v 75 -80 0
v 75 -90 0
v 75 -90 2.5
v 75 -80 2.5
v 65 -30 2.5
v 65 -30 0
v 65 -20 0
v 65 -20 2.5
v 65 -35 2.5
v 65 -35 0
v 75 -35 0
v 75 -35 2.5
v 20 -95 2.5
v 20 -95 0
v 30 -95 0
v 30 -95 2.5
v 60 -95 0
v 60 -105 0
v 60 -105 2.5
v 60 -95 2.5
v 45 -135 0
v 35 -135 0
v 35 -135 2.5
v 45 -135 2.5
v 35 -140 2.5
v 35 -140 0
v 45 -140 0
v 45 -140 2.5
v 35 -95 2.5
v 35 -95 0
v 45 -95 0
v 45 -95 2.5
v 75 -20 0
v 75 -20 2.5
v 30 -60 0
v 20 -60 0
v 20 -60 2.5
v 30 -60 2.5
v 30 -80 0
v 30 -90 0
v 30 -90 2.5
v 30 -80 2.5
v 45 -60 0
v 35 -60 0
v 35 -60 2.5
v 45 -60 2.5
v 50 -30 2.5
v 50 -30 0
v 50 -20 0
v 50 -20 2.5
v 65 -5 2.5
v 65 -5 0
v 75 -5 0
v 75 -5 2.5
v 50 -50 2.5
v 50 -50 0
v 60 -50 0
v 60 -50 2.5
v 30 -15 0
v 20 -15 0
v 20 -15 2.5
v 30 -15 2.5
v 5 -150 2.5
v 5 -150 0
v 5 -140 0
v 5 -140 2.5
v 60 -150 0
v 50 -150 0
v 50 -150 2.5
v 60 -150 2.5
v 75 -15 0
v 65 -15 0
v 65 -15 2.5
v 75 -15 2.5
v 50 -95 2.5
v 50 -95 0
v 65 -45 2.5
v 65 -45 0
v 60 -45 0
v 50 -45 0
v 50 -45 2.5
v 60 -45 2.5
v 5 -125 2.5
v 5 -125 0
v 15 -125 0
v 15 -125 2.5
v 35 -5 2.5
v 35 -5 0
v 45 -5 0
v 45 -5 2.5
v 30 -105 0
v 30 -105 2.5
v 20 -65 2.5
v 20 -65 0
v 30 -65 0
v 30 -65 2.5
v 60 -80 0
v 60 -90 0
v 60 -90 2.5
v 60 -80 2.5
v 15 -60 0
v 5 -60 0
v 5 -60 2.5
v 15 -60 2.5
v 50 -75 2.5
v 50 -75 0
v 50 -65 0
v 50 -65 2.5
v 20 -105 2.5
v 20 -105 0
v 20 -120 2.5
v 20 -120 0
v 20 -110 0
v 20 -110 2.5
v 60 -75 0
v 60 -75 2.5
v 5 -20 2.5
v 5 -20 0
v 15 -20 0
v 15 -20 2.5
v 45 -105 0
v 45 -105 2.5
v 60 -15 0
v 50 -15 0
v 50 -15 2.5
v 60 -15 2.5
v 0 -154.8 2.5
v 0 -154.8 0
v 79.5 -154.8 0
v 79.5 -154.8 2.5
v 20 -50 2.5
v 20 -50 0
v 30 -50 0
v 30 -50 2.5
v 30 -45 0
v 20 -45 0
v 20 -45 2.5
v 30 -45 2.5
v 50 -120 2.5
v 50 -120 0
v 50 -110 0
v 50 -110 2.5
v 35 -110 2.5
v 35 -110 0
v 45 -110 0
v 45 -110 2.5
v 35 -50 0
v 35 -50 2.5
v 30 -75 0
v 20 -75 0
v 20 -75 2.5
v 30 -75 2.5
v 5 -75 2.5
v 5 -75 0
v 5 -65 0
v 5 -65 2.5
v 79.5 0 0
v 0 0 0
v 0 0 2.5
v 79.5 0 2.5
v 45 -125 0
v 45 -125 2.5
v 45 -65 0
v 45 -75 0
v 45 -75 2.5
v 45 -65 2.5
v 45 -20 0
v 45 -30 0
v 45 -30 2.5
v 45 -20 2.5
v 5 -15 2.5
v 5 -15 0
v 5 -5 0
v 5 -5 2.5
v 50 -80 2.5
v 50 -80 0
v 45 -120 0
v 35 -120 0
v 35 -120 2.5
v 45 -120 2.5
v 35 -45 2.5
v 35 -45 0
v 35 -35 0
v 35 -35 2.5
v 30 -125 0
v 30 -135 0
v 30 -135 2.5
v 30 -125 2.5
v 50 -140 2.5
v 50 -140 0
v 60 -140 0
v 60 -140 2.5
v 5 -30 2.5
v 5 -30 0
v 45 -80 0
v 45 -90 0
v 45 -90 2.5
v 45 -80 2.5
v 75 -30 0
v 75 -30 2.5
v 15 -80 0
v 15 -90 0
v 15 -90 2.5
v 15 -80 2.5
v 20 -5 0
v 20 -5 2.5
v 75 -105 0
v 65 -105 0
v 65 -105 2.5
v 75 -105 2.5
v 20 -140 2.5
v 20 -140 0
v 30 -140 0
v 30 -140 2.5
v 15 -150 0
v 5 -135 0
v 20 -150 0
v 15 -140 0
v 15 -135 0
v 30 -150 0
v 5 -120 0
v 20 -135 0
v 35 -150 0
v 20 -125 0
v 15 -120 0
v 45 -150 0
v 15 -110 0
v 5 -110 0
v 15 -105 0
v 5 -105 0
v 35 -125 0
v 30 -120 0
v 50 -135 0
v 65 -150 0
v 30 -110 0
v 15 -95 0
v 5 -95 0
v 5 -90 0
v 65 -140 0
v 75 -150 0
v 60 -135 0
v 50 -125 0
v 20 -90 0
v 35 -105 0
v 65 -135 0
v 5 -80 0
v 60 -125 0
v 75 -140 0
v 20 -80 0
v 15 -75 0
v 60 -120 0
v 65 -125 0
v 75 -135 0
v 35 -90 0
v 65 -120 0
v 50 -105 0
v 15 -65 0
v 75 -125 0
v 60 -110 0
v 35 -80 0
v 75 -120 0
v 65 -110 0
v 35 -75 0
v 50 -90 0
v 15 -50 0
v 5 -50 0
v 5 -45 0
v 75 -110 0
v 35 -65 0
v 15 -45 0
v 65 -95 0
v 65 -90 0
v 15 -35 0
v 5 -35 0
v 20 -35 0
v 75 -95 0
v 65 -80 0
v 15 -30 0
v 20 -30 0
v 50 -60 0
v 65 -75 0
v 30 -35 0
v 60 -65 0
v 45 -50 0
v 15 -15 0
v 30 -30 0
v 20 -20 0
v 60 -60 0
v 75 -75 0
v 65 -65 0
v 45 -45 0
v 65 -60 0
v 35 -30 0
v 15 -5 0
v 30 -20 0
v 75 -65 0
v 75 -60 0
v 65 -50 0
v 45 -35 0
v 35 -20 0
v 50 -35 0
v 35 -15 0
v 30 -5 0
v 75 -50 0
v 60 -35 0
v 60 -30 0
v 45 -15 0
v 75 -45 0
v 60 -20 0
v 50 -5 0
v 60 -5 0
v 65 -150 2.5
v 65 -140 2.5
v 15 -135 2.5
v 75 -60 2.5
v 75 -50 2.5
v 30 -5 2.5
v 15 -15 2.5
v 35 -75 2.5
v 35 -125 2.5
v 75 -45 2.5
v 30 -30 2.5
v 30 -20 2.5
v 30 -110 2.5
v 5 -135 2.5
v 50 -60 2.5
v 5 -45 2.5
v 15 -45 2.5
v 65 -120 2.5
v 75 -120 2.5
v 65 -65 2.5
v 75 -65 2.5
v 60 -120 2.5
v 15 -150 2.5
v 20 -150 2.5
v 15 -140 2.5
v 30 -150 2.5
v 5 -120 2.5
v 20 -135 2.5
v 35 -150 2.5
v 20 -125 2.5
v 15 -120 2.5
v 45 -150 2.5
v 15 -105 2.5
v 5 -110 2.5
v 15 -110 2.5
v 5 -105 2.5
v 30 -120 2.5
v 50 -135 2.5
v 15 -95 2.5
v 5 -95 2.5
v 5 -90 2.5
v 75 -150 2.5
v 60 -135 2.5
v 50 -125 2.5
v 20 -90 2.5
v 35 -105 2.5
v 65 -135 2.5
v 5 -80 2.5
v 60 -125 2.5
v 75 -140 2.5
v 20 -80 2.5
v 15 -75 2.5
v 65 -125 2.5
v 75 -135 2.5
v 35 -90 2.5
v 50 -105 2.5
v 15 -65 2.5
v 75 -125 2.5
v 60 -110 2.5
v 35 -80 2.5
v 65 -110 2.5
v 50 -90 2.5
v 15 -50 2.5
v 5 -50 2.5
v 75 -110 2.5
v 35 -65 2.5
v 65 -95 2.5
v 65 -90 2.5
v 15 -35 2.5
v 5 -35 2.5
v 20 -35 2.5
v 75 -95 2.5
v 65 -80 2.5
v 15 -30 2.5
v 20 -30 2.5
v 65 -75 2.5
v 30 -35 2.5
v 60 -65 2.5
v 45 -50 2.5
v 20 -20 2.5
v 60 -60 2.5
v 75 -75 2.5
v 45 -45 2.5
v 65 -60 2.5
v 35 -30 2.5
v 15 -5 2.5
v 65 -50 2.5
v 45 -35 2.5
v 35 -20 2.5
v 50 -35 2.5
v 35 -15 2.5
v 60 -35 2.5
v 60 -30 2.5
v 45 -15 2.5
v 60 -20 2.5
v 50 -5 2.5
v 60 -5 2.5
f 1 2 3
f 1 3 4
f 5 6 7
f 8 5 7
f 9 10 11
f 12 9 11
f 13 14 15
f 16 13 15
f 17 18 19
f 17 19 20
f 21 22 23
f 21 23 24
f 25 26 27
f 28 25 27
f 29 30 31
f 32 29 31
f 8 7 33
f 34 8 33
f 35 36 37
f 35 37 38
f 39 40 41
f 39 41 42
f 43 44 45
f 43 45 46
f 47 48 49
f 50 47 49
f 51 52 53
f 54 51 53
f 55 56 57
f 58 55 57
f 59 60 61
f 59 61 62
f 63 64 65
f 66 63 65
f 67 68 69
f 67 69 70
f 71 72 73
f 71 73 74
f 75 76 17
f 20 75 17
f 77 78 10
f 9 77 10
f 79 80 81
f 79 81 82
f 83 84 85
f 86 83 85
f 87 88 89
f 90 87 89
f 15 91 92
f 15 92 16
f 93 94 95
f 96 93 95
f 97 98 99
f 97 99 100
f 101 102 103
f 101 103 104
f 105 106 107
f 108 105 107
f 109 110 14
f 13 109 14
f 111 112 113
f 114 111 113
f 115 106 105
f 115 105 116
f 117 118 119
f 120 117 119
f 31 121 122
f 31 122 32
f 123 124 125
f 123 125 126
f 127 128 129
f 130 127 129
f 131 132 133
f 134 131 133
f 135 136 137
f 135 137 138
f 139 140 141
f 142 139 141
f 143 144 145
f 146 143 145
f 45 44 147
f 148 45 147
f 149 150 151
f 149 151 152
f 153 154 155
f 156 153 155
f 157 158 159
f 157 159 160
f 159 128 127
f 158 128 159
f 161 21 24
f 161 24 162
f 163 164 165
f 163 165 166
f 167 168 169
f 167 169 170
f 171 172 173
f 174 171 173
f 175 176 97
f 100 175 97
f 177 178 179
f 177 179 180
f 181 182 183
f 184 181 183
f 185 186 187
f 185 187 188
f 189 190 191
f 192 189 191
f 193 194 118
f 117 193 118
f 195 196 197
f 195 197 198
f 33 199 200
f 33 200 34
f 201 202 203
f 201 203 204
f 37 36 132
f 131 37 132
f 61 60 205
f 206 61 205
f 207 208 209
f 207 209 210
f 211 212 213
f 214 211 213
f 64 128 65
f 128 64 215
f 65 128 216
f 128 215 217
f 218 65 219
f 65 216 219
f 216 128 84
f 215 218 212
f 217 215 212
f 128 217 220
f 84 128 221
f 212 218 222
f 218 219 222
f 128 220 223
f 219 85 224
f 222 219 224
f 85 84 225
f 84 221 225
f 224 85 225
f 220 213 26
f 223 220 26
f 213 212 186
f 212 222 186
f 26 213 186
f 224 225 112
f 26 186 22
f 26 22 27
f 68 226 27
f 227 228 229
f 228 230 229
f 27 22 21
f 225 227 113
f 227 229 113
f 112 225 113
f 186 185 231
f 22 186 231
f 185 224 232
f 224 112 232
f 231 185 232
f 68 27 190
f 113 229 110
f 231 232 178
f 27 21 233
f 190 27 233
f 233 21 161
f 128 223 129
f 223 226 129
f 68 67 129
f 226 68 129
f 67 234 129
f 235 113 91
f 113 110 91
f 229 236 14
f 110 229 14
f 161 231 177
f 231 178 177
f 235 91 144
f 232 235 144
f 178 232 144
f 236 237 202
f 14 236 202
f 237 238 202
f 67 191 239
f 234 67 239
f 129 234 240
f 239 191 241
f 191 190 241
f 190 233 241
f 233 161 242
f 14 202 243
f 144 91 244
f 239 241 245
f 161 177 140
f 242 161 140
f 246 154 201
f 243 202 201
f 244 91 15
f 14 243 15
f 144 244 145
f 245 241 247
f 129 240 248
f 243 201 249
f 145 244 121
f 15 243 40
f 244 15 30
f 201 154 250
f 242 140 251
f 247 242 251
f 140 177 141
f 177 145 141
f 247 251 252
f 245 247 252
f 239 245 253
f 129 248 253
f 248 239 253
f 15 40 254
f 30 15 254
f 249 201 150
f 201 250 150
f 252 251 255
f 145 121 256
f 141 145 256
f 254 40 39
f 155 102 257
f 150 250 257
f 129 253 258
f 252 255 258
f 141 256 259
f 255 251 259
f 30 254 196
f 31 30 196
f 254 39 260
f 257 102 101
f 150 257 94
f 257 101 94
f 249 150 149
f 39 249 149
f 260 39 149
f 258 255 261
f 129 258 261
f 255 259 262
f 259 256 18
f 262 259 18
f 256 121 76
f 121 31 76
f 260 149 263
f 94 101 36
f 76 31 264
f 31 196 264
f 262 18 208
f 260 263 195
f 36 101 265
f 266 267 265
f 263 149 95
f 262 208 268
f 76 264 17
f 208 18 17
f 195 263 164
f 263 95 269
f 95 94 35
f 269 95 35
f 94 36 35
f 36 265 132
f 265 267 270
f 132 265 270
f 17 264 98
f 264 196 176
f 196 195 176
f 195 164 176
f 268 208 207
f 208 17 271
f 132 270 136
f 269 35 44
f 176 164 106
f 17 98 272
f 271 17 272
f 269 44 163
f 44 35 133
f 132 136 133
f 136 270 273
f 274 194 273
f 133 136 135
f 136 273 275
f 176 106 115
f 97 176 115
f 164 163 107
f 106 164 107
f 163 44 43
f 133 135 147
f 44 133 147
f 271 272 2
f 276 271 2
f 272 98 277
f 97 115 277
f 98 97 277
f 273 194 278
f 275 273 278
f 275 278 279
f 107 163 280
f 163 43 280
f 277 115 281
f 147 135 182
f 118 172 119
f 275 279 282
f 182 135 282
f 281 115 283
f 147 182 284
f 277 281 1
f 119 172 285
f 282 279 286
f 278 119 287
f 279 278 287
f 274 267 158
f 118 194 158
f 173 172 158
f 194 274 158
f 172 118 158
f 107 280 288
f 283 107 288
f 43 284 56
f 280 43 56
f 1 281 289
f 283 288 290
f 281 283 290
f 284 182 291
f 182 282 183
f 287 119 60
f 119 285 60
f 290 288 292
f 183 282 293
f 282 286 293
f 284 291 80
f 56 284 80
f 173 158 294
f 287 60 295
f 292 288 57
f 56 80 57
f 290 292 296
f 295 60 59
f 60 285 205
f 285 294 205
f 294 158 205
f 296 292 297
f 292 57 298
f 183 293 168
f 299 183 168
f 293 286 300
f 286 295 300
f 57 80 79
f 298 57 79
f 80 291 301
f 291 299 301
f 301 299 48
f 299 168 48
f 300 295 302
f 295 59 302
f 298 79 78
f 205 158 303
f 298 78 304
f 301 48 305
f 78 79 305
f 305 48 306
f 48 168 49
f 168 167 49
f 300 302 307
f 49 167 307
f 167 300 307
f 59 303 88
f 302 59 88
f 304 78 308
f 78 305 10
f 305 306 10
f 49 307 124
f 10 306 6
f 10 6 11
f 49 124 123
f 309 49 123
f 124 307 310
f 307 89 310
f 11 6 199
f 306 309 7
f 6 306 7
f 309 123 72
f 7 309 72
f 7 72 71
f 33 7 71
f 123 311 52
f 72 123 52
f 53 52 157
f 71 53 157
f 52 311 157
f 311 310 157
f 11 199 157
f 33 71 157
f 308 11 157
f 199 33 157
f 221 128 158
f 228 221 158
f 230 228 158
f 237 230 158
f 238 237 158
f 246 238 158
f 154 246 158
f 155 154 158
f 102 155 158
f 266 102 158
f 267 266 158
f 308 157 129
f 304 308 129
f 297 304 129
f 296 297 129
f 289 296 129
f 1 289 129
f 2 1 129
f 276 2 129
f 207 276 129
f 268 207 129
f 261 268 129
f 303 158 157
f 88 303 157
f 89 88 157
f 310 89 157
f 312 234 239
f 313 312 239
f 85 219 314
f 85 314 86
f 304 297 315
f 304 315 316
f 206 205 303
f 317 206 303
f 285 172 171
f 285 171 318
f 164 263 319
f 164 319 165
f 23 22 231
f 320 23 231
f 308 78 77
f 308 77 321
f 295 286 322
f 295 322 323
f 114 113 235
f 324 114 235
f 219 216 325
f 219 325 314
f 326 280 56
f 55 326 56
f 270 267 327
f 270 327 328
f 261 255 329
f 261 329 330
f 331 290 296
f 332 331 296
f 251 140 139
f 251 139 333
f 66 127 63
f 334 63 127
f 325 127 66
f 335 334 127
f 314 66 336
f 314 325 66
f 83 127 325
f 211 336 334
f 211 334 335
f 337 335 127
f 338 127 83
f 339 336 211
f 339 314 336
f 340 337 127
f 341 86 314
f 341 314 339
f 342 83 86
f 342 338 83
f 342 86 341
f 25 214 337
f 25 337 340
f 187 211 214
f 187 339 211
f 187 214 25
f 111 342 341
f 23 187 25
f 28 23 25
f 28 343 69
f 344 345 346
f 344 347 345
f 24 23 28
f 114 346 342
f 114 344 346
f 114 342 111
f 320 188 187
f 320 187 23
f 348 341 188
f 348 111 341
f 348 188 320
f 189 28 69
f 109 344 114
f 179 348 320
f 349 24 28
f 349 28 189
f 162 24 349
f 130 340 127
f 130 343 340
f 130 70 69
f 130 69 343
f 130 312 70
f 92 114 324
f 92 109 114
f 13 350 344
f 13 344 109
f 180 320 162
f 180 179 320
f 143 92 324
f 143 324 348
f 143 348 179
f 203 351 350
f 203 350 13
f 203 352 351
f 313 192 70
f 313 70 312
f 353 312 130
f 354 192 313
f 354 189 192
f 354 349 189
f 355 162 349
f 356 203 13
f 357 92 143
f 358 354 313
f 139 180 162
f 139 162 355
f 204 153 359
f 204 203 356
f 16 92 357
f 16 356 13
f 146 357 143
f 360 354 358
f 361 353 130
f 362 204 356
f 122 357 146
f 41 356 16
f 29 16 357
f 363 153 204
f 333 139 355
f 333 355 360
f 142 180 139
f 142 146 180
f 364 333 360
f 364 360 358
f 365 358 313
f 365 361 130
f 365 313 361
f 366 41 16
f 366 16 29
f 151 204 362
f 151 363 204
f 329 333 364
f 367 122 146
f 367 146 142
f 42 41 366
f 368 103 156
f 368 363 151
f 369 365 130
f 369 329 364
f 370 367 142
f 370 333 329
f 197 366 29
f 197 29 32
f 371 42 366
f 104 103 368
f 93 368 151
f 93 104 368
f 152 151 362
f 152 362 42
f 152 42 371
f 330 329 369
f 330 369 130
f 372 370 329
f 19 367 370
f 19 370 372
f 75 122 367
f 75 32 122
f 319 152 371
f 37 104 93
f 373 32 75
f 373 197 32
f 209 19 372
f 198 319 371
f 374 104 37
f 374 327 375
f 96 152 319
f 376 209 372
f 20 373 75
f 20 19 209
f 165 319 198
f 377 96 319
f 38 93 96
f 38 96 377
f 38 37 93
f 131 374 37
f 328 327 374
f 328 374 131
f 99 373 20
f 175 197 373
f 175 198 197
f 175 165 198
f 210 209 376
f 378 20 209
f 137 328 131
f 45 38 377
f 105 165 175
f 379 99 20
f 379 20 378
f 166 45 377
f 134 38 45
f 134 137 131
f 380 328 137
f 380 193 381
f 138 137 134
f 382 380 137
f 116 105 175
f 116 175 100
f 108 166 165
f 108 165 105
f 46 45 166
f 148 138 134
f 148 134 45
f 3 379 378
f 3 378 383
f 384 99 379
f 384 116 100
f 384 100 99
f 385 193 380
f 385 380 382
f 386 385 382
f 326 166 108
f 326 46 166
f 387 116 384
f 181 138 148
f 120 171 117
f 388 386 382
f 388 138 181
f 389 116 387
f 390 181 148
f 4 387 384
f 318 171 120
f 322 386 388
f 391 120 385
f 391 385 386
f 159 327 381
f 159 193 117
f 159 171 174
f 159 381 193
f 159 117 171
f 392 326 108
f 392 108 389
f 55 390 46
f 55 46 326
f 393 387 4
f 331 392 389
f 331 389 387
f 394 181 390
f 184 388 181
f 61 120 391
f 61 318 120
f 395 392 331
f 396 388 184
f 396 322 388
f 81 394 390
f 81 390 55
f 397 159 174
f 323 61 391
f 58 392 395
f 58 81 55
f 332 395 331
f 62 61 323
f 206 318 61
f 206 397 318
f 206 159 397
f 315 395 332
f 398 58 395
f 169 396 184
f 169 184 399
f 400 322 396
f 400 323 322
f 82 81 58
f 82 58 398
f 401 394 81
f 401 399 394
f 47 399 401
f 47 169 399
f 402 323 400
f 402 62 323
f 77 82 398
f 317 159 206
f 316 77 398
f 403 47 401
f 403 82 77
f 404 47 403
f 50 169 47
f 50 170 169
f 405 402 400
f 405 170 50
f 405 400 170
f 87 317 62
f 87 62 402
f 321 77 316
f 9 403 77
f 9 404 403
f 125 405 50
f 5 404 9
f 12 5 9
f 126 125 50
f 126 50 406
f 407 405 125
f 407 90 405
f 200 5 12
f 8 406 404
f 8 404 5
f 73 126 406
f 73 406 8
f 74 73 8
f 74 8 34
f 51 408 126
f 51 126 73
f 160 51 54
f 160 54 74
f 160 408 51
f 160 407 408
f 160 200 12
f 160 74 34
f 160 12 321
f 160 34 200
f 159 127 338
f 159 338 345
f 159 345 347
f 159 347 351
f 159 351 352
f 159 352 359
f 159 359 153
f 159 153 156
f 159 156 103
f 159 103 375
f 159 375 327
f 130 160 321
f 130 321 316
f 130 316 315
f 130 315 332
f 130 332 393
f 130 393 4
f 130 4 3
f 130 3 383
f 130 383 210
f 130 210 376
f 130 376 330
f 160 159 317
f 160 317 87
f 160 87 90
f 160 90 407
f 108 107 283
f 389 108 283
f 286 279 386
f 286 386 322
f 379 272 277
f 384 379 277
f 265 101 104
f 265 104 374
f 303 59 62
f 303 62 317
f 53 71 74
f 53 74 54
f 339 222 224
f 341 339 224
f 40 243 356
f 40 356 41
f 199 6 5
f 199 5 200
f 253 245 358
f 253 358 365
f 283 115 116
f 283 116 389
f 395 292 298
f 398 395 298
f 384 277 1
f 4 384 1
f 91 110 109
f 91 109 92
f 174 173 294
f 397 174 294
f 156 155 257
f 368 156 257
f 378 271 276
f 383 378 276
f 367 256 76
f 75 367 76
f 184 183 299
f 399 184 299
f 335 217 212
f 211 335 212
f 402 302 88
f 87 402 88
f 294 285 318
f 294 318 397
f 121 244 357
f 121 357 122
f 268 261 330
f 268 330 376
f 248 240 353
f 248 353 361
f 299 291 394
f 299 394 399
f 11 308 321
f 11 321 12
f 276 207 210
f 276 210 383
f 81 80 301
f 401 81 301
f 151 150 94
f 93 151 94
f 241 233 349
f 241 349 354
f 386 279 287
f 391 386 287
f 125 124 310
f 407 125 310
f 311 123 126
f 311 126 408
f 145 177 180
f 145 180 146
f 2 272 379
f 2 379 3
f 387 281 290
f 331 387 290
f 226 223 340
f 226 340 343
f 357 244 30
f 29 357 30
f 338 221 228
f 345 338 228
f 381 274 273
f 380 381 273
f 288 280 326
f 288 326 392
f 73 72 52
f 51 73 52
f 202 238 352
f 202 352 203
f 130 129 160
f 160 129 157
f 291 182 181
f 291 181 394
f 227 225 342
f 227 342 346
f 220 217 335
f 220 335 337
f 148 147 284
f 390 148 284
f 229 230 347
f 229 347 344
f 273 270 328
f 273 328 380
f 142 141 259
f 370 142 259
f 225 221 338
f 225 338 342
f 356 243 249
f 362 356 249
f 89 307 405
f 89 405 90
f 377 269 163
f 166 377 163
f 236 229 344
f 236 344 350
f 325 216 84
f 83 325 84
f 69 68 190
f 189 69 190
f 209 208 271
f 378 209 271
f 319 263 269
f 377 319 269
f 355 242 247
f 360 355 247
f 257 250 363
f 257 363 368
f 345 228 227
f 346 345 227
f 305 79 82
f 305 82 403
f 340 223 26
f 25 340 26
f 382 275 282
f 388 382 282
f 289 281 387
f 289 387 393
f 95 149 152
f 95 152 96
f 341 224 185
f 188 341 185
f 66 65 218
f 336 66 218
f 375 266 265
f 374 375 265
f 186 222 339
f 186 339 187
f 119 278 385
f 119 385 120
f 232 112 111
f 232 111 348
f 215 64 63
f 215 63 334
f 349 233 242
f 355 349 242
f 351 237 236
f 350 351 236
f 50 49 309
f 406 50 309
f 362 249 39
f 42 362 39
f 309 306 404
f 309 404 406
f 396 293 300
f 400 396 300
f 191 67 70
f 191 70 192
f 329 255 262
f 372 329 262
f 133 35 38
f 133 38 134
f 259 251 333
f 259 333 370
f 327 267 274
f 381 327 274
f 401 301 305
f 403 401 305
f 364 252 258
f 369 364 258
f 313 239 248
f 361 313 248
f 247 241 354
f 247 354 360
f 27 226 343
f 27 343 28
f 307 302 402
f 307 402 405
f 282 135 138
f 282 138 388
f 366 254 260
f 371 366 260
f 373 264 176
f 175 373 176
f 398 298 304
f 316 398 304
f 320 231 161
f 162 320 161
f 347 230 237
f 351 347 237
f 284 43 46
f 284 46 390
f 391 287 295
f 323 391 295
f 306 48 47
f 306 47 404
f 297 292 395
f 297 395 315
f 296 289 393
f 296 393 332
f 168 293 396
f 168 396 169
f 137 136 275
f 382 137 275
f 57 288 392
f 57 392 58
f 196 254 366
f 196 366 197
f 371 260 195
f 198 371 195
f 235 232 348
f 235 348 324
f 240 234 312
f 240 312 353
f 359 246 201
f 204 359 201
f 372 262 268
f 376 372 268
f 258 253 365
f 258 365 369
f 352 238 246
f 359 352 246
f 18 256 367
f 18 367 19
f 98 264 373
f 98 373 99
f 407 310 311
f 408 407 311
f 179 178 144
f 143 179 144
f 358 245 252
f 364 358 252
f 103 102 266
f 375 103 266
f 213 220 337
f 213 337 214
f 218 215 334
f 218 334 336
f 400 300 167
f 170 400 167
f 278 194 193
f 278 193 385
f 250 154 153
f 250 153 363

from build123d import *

# Parameters (mm, degrees)
SKETCH1_W           = 79.5
SKETCH1_H           = 154.8
SKETCH1_W_2         = 10
SKETCH1_H_2         = 10
BOSS_EXTRUDE1_DEPTH = 2.5


with BuildPart() as part:
    # Sketch1 → Boss-Extrude1 (new body)
    with BuildSketch(Plane.XY):
        with Locations((39.75, -77.4)):
            Rectangle(SKETCH1_W, SKETCH1_H)
        with Locations((10, -10)):
            Rectangle(SKETCH1_W_2, SKETCH1_H_2, mode=Mode.SUBTRACT)
        with Locations((25, -10)):
            Rectangle(SKETCH1_W_2, SKETCH1_H_2, mode=Mode.SUBTRACT)
        with Locations((40, -10)):
            Rectangle(SKETCH1_W_2, SKETCH1_H_2, mode=Mode.SUBTRACT)
        with Locations((55, -10)):
            Rectangle(SKETCH1_W_2, SKETCH1_H_2, mode=Mode.SUBTRACT)
        with Locations((70, -10)):
            Rectangle(SKETCH1_W_2, SKETCH1_H_2, mode=Mode.SUBTRACT)
        with Locations((25, -25)):
            Rectangle(SKETCH1_W_2, SKETCH1_H_2, mode=Mode.SUBTRACT)
        with Locations((40, -25)):
            Rectangle(SKETCH1_W_2, SKETCH1_H_2, mode=Mode.SUBTRACT)
        with Locations((55, -25)):
            Rectangle(SKETCH1_W_2, SKETCH1_H_2, mode=Mode.SUBTRACT)
        with Locations((70, -25)):
            Rectangle(SKETCH1_W_2, SKETCH1_H_2, mode=Mode.SUBTRACT)
        with Locations((25, -40)):
            Rectangle(SKETCH1_W_2, SKETCH1_H_2, mode=Mode.SUBTRACT)
        with Locations((40, -40)):
            Rectangle(SKETCH1_W_2, SKETCH1_H_2, mode=Mode.SUBTRACT)
        with Locations((55, -40)):
            Rectangle(SKETCH1_W_2, SKETCH1_H_2, mode=Mode.SUBTRACT)
        with Locations((70, -40)):
            Rectangle(SKETCH1_W_2, SKETCH1_H_2, mode=Mode.SUBTRACT)
        with Locations((25, -55)):
            Rectangle(SKETCH1_W_2, SKETCH1_H_2, mode=Mode.SUBTRACT)
        with Locations((40, -55)):
            Rectangle(SKETCH1_W_2, SKETCH1_H_2, mode=Mode.SUBTRACT)
        with Locations((55, -55)):
            Rectangle(SKETCH1_W_2, SKETCH1_H_2, mode=Mode.SUBTRACT)
        with Locations((70, -55)):
            Rectangle(SKETCH1_W_2, SKETCH1_H_2, mode=Mode.SUBTRACT)
        with Locations((25, -70)):
            Rectangle(SKETCH1_W_2, SKETCH1_H_2, mode=Mode.SUBTRACT)
        with Locations((40, -70)):
            Rectangle(SKETCH1_W_2, SKETCH1_H_2, mode=Mode.SUBTRACT)
        with Locations((55, -70)):
            Rectangle(SKETCH1_W_2, SKETCH1_H_2, mode=Mode.SUBTRACT)
        with Locations((70, -70)):
            Rectangle(SKETCH1_W_2, SKETCH1_H_2, mode=Mode.SUBTRACT)
        with Locations((25, -85)):
            Rectangle(SKETCH1_W_2, SKETCH1_H_2, mode=Mode.SUBTRACT)
        with Locations((40, -85)):
            Rectangle(SKETCH1_W_2, SKETCH1_H_2, mode=Mode.SUBTRACT)
        with Locations((55, -85)):
            Rectangle(SKETCH1_W_2, SKETCH1_H_2, mode=Mode.SUBTRACT)
        with Locations((70, -85)):
            Rectangle(SKETCH1_W_2, SKETCH1_H_2, mode=Mode.SUBTRACT)
        with Locations((25, -100)):
            Rectangle(SKETCH1_W_2, SKETCH1_H_2, mode=Mode.SUBTRACT)
        with Locations((40, -100)):
            Rectangle(SKETCH1_W_2, SKETCH1_H_2, mode=Mode.SUBTRACT)
        with Locations((55, -100)):
            Rectangle(SKETCH1_W_2, SKETCH1_H_2, mode=Mode.SUBTRACT)
        with Locations((70, -100)):
            Rectangle(SKETCH1_W_2, SKETCH1_H_2, mode=Mode.SUBTRACT)
        with Locations((25, -115)):
            Rectangle(SKETCH1_W_2, SKETCH1_H_2, mode=Mode.SUBTRACT)
        with Locations((40, -115)):
            Rectangle(SKETCH1_W_2, SKETCH1_H_2, mode=Mode.SUBTRACT)
        with Locations((55, -115)):
            Rectangle(SKETCH1_W_2, SKETCH1_H_2, mode=Mode.SUBTRACT)
        with Locations((70, -115)):
            Rectangle(SKETCH1_W_2, SKETCH1_H_2, mode=Mode.SUBTRACT)
        with Locations((25, -130)):
            Rectangle(SKETCH1_W_2, SKETCH1_H_2, mode=Mode.SUBTRACT)
        with Locations((40, -130)):
            Rectangle(SKETCH1_W_2, SKETCH1_H_2, mode=Mode.SUBTRACT)
        with Locations((55, -130)):
            Rectangle(SKETCH1_W_2, SKETCH1_H_2, mode=Mode.SUBTRACT)
        with Locations((70, -130)):
            Rectangle(SKETCH1_W_2, SKETCH1_H_2, mode=Mode.SUBTRACT)
        with Locations((25, -145)):
            Rectangle(SKETCH1_W_2, SKETCH1_H_2, mode=Mode.SUBTRACT)
        with Locations((40, -145)):
            Rectangle(SKETCH1_W_2, SKETCH1_H_2, mode=Mode.SUBTRACT)
        with Locations((55, -145)):
            Rectangle(SKETCH1_W_2, SKETCH1_H_2, mode=Mode.SUBTRACT)
        with Locations((70, -145)):
            Rectangle(SKETCH1_W_2, SKETCH1_H_2, mode=Mode.SUBTRACT)
        with Locations((10, -25)):
            Rectangle(SKETCH1_W_2, SKETCH1_H_2, mode=Mode.SUBTRACT)
        with Locations((10, -40)):
            Rectangle(SKETCH1_W_2, SKETCH1_H_2, mode=Mode.SUBTRACT)
        with Locations((10, -55)):
            Rectangle(SKETCH1_W_2, SKETCH1_H_2, mode=Mode.SUBTRACT)
        with Locations((10, -70)):
            Rectangle(SKETCH1_W_2, SKETCH1_H_2, mode=Mode.SUBTRACT)
        with Locations((10, -85)):
            Rectangle(SKETCH1_W_2, SKETCH1_H_2, mode=Mode.SUBTRACT)
        with Locations((10, -100)):
            Rectangle(SKETCH1_W_2, SKETCH1_H_2, mode=Mode.SUBTRACT)
        with Locations((10, -115)):
            Rectangle(SKETCH1_W_2, SKETCH1_H_2, mode=Mode.SUBTRACT)
        with Locations((10, -130)):
            Rectangle(SKETCH1_W_2, SKETCH1_H_2, mode=Mode.SUBTRACT)
        with Locations((10, -145)):
            Rectangle(SKETCH1_W_2, SKETCH1_H_2, mode=Mode.SUBTRACT)
    extrude(amount=BOSS_EXTRUDE1_DEPTH)


solid = part.part
